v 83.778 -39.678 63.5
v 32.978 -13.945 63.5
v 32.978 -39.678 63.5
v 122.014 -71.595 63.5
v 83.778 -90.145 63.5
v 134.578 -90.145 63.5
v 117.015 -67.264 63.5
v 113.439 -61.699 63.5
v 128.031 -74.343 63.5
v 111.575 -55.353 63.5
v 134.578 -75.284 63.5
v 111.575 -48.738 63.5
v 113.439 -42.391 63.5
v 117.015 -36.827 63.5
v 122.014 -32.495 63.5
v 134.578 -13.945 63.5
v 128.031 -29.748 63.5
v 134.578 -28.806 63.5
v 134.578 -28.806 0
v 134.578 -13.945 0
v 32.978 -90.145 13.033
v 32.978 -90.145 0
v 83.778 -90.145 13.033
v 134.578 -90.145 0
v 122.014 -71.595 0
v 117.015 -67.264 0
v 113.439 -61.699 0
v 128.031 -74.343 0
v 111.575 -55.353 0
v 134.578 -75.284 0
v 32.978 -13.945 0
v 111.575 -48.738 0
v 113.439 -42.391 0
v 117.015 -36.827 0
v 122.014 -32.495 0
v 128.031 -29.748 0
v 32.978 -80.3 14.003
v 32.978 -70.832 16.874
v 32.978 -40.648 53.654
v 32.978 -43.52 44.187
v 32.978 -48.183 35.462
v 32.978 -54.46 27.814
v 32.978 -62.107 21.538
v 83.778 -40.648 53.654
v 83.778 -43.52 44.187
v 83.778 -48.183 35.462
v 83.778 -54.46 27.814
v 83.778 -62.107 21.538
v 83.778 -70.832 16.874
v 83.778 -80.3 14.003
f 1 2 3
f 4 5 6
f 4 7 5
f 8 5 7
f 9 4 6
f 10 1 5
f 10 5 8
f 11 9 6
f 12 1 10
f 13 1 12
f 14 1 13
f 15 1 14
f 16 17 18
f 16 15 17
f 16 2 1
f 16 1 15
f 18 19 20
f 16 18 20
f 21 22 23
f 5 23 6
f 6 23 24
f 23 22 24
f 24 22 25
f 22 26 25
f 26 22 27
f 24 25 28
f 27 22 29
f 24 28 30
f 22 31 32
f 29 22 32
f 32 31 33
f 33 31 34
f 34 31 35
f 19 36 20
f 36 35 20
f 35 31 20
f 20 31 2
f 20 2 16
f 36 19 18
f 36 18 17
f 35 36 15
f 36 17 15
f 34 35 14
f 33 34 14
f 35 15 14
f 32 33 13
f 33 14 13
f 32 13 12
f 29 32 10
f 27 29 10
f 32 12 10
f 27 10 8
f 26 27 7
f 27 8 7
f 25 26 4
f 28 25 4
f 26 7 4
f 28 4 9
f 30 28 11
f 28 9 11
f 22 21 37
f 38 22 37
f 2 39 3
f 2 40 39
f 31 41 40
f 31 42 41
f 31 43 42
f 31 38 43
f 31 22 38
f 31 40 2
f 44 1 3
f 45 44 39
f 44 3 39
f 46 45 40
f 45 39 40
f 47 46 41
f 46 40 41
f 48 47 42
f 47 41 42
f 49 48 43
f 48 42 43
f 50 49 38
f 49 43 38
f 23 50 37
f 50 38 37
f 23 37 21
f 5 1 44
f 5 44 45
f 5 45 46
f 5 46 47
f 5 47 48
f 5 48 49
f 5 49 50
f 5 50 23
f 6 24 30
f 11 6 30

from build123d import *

# Parameters (mm, degrees)
F0_W     = 101.6
F0_H     = 76.2
F1_DEPTH = 63.5
F3_DEPTH = 71.628
F4_R     = 50.467154
F5_DEPTH = 50.8


with BuildPart() as f1:
    # F0 (on Top) → F1 (new body)
    with BuildSketch(Plane.XY):
        with Locations((83.7779, -52.045282)):
            Rectangle(F0_W, F0_H)
    extrude(amount=F1_DEPTH)

    # F2 (on face) → F3 (cut)
    with BuildSketch(Plane.XY.offset(63.5)):
        with BuildLine():
            ThreePointArc((134.5779, -75.284243), (151.010327, -68.477709), (157.81686, -52.045282))
            ThreePointArc((157.81686, -52.045282), (151.010327, -35.612856), (134.5779, -28.806322))
            Line((134.5779, -28.806322), (134.5779, -75.284243))
        make_face()
        with BuildLine():
            Line((134.5779, -75.284243), (134.5779, -28.806322))
            ThreePointArc((134.5779, -28.806322), (111.33894, -52.045282), (134.5779, -75.284243))
        make_face()
    extrude(amount=-F3_DEPTH, mode=Mode.SUBTRACT)

    # F4 (on face) → F5 (cut)
    with BuildSketch(Plane(origin=(32.9779, 0, 0), x_dir=(0, -1, 0), z_dir=(-1, 0, 0))):
        with Locations((90.145282, 63.5)):
            Circle(F4_R)
    extrude(amount=-F5_DEPTH, mode=Mode.SUBTRACT)


solid = f1.part
